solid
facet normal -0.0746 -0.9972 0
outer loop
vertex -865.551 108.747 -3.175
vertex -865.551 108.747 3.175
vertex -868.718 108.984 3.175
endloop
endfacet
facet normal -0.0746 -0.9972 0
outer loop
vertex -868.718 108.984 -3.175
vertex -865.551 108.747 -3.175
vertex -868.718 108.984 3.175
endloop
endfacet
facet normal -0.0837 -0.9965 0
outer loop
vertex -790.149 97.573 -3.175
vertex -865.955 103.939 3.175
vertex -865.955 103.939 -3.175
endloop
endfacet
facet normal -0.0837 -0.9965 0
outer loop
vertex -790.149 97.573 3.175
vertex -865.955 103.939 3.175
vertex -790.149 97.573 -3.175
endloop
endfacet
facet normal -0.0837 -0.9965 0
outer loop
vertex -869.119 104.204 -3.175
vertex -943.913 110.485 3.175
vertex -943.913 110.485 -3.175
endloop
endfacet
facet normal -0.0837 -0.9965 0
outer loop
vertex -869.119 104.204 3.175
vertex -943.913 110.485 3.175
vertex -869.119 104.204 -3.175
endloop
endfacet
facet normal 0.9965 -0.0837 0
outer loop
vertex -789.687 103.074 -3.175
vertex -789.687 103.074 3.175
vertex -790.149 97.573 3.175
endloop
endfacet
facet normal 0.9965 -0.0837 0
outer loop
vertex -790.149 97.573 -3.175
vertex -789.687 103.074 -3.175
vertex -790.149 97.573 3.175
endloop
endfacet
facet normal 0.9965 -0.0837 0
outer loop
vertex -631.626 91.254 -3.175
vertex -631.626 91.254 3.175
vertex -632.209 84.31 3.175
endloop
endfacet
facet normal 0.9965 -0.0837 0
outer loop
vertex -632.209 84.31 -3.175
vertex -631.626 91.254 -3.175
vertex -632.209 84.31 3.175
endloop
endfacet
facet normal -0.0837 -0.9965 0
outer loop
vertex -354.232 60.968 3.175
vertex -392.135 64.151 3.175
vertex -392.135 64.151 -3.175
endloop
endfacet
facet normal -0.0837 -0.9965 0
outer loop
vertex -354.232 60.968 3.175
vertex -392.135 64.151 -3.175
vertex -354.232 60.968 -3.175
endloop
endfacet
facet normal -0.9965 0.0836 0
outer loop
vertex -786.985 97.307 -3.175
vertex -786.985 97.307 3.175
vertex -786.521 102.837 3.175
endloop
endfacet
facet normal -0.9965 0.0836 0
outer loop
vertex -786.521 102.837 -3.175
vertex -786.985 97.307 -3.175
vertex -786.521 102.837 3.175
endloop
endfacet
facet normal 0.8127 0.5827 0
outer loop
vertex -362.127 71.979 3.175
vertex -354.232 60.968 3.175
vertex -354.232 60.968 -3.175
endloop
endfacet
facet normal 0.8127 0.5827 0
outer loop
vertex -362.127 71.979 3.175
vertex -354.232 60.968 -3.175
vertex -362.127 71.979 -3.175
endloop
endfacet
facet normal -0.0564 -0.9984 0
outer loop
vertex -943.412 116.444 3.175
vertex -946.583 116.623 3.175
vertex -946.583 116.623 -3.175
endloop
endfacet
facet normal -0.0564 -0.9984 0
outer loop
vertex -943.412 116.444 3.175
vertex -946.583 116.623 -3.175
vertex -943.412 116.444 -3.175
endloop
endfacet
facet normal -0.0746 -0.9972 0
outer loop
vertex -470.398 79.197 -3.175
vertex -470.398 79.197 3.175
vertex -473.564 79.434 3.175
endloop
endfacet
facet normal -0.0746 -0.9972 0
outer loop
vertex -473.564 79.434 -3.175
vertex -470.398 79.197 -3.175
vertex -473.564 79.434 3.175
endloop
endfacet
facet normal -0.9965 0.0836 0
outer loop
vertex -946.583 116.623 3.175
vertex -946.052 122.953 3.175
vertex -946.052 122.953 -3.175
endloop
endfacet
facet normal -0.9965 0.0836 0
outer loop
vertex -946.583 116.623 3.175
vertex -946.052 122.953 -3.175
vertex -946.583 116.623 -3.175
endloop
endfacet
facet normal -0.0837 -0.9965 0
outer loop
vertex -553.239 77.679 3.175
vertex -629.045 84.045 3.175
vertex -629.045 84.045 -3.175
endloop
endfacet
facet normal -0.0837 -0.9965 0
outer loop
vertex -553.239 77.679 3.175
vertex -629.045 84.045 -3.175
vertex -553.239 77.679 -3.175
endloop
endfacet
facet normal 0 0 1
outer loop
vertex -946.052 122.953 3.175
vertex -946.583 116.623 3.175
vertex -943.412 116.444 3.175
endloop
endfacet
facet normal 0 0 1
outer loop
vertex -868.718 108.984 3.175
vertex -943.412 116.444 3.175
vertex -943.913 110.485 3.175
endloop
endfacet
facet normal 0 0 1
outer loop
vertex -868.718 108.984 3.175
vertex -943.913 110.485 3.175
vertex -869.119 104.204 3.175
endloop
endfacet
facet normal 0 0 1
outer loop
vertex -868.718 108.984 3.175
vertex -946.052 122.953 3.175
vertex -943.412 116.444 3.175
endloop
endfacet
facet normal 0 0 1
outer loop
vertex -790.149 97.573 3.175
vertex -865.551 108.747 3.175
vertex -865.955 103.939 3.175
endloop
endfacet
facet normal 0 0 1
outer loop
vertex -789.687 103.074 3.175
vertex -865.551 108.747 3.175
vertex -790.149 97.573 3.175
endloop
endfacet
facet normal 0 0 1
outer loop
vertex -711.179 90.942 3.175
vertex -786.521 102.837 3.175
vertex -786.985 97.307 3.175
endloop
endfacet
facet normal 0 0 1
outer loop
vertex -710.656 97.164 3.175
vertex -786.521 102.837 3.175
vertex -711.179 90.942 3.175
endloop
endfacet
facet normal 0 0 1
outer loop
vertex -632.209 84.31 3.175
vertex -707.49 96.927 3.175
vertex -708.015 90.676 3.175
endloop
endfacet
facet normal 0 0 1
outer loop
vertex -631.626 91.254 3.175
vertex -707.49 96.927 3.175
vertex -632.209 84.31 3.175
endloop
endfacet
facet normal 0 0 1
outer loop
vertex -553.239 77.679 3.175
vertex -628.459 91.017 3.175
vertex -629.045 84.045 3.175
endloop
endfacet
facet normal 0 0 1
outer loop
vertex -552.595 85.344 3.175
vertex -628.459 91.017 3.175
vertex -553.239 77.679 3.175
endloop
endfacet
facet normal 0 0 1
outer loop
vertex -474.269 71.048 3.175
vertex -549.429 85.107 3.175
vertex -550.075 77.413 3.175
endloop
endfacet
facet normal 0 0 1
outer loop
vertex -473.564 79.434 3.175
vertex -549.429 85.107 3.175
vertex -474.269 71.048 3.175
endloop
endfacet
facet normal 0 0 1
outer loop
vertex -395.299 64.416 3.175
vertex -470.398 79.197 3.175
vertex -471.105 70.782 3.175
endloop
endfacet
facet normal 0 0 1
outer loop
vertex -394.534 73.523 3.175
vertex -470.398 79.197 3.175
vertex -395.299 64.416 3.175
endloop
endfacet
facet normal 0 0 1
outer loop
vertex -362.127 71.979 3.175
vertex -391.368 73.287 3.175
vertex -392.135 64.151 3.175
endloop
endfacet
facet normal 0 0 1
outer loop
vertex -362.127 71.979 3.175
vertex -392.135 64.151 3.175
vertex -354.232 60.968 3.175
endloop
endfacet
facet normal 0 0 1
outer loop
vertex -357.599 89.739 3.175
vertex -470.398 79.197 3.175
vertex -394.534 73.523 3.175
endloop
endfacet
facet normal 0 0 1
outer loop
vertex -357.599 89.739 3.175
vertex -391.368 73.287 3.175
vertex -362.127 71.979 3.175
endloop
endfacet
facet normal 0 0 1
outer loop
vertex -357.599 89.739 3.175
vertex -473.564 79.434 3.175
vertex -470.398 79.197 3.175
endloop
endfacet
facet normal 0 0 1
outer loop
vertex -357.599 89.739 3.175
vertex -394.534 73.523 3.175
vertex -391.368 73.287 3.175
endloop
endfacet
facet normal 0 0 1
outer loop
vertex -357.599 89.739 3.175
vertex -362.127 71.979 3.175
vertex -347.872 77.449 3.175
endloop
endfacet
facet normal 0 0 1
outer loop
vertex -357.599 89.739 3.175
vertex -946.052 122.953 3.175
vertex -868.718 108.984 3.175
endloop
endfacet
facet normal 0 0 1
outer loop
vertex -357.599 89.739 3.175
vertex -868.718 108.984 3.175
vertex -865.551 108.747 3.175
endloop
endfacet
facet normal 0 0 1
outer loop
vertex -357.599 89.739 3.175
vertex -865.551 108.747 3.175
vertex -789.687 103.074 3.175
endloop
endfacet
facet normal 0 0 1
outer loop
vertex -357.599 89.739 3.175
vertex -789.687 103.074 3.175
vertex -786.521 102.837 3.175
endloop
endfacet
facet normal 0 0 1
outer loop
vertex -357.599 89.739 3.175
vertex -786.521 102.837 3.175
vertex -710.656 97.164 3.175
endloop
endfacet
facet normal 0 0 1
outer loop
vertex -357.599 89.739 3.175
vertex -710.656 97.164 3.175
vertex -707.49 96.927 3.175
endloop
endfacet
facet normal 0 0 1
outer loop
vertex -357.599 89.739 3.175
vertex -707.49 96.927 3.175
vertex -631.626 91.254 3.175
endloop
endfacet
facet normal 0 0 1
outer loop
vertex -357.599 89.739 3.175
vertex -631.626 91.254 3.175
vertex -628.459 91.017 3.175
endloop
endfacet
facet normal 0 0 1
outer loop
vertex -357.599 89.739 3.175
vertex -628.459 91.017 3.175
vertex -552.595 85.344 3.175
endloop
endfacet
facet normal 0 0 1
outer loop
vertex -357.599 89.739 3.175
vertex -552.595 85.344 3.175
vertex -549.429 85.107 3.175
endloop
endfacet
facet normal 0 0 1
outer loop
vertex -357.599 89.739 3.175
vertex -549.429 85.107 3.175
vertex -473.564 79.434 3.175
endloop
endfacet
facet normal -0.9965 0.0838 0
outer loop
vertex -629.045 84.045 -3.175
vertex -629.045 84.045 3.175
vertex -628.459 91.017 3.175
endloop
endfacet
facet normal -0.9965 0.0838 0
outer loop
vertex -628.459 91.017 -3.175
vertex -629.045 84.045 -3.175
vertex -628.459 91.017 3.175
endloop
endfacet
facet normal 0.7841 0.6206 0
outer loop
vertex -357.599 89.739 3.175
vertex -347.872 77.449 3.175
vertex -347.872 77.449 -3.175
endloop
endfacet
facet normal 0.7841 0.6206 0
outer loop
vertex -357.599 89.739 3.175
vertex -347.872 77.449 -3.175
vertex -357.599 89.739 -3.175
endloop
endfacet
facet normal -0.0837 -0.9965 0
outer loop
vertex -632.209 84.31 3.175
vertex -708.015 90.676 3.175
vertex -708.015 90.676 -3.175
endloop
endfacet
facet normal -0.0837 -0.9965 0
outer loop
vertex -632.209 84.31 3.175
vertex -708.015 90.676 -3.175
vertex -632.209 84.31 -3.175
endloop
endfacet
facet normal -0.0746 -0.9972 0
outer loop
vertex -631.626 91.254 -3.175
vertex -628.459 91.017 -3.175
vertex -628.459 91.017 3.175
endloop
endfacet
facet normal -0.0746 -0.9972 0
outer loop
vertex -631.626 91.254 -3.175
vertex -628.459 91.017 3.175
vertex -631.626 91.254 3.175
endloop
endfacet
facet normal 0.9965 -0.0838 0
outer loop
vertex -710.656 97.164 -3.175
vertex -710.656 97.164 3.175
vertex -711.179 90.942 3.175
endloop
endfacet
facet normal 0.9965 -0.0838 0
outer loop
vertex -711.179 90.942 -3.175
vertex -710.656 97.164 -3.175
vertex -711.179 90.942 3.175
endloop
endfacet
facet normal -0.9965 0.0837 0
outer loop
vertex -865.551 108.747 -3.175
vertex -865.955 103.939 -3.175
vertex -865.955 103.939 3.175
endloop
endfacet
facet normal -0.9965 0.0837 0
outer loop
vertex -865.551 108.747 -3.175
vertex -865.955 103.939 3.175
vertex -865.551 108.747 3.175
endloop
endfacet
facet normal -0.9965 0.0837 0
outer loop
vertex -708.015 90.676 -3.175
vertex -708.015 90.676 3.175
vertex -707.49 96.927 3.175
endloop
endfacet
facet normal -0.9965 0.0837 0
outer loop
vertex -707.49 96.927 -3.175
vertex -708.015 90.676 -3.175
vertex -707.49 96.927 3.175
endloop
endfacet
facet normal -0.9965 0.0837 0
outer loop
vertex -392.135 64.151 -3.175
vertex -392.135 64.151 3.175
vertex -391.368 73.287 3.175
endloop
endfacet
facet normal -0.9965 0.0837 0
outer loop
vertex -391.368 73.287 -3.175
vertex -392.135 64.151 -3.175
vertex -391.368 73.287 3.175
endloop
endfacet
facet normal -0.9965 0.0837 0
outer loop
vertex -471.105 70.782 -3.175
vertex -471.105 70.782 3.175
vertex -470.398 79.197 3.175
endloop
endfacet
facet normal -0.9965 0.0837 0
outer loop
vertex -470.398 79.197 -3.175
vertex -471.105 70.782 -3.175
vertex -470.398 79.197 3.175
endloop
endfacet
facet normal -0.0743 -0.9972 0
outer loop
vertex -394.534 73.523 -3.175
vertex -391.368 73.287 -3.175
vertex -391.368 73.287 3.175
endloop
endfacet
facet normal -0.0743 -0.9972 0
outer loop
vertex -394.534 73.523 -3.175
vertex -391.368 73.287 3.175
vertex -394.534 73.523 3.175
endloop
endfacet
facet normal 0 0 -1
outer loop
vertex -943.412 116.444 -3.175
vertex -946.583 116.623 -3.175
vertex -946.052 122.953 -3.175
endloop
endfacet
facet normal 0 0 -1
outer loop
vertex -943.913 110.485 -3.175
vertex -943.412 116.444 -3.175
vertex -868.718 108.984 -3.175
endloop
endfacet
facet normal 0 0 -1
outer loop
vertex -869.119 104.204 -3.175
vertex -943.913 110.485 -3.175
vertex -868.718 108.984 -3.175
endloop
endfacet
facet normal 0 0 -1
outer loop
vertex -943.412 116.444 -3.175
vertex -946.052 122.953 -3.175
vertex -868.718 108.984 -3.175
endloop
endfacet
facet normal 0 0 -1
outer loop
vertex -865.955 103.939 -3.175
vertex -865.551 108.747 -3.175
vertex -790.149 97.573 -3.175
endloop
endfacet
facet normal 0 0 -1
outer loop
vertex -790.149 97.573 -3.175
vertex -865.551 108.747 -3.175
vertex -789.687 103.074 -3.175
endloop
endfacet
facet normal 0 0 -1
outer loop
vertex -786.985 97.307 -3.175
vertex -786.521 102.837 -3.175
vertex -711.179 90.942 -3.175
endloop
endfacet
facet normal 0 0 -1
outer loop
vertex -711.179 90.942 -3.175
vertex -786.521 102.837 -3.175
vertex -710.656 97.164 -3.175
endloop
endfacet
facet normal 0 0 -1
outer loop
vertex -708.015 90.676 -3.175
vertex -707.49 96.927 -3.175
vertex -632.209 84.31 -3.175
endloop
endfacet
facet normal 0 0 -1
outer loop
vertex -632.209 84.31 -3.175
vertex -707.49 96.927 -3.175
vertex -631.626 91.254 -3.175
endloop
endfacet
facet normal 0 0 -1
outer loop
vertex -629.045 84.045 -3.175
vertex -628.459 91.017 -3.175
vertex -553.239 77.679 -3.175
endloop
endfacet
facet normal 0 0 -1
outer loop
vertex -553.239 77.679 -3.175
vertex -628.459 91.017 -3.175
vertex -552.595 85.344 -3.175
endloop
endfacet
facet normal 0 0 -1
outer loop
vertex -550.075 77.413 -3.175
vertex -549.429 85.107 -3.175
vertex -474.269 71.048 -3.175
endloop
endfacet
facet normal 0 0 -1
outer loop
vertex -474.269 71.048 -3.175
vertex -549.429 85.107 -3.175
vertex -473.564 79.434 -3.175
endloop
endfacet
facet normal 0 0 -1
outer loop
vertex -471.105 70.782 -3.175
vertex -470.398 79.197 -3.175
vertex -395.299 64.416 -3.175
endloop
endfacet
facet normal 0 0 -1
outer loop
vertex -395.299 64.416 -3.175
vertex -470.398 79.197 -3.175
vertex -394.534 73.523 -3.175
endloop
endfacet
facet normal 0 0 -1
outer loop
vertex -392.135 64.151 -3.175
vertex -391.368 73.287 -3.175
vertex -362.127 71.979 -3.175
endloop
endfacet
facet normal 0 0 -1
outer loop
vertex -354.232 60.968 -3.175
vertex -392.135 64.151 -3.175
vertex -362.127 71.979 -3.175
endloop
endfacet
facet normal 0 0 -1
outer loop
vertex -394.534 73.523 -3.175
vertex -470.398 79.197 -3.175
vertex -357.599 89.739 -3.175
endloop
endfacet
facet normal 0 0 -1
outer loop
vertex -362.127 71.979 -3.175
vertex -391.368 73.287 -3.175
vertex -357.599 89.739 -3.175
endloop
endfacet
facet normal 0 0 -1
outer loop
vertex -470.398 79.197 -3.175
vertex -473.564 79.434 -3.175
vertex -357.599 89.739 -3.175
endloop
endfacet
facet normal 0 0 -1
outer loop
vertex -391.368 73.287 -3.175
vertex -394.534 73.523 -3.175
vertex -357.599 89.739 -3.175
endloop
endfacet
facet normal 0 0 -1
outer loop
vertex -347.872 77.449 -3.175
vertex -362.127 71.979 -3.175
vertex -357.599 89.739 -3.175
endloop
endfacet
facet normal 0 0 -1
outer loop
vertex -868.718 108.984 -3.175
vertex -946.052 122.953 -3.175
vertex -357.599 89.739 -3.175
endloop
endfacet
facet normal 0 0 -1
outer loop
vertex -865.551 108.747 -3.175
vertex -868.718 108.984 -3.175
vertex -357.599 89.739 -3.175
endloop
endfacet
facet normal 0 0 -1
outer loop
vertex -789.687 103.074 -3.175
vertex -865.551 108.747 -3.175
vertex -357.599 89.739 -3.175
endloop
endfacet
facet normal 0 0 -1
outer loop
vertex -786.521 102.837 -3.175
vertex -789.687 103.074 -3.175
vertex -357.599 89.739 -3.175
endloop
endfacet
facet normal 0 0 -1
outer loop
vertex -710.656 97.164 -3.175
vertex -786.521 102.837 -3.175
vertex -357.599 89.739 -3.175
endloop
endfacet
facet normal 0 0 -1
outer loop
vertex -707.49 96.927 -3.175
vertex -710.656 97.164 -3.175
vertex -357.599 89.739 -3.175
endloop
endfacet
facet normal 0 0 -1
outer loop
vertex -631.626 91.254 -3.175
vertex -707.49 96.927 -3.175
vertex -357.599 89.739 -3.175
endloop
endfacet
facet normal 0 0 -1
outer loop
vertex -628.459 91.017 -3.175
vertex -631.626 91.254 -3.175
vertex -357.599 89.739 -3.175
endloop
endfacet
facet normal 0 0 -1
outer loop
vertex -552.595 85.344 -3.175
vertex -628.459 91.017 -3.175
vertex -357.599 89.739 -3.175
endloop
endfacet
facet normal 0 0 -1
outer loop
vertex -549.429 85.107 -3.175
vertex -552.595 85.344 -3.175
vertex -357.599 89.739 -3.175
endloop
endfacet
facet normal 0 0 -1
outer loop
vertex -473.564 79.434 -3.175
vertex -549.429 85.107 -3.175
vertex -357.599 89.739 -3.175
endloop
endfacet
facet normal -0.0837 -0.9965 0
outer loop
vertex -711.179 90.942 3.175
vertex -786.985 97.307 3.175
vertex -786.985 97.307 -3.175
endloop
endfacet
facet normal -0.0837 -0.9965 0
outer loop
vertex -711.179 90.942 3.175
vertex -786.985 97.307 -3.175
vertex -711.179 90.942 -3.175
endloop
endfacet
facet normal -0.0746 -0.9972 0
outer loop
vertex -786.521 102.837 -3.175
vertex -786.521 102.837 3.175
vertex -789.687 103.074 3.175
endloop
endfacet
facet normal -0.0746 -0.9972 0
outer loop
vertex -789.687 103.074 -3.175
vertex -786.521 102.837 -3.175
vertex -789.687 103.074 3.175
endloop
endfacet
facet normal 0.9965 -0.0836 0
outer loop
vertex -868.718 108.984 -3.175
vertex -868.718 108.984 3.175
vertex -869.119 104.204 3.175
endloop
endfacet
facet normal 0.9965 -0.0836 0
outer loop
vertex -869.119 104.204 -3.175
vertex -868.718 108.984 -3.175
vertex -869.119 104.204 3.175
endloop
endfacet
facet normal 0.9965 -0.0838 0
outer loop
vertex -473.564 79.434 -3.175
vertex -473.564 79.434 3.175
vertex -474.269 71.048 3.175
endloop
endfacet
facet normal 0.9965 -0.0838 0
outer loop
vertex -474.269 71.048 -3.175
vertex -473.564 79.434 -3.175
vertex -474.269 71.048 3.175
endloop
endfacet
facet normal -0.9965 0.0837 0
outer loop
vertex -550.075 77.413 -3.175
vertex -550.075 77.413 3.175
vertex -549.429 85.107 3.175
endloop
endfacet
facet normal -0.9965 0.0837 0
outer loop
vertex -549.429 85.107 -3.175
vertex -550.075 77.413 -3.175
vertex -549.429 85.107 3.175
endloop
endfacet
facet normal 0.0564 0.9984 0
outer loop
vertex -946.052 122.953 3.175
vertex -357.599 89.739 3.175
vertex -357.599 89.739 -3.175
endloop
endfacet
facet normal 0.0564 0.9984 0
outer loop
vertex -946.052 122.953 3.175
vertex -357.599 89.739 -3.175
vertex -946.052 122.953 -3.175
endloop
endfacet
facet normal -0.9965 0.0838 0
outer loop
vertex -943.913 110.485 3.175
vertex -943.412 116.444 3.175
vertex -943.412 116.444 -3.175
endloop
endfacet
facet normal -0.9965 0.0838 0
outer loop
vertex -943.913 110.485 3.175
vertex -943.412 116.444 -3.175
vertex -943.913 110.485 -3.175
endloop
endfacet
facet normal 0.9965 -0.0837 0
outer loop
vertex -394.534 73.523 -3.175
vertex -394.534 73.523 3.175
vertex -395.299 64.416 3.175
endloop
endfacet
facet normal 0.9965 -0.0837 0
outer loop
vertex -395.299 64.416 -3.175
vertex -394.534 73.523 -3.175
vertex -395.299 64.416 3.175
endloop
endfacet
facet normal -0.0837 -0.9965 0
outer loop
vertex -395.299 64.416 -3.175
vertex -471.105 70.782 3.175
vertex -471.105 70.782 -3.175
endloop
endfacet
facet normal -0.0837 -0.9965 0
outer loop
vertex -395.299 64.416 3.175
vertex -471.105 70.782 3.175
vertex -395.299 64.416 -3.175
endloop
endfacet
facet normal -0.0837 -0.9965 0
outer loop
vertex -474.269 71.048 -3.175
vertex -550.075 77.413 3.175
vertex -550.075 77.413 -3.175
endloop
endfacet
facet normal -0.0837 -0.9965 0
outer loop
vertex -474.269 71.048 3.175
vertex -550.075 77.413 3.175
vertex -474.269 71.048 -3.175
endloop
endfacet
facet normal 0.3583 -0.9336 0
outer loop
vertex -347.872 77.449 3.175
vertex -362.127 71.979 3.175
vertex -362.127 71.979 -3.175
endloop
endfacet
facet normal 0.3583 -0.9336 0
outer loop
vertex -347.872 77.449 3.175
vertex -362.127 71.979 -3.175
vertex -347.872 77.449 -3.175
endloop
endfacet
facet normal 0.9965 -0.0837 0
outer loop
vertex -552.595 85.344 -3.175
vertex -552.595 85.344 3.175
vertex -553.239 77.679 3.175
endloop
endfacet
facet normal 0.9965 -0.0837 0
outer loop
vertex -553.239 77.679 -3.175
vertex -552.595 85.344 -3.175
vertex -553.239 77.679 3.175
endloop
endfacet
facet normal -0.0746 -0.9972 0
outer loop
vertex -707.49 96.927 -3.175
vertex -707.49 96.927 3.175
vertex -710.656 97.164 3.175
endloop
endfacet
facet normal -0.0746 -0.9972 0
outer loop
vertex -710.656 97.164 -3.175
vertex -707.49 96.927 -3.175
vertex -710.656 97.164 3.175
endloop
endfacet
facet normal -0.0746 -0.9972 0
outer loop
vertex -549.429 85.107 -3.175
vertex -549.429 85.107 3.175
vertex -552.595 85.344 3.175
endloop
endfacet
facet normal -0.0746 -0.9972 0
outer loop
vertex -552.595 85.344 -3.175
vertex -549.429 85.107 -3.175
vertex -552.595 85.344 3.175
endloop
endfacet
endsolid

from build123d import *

# Parameters (mm, degrees)
BOSS_EXTRUDE1_DEPTH = 3.175
CUT_EXTRUDE1_DEPTH  = 7.35
CUT_EXTRUDE2_DEPTH  = 7.62


with BuildPart() as part:
    # Sketch1 → Boss-Extrude1 (new body, symmetric)
    with BuildSketch(Plane.XY):
        Polygon((76.2, 37.697541537), (76.2, 56.747541537), (79.375, 56.747541537), (79.375, 37.697541537), (92.075, 37.697541537), (92.075, 46.587541537), (95.25, 46.587541537), (95.25, 37.697541537), (136.525, 37.697541537), (136.525, 46.587541537), (139.7, 46.587541537), (139.7, 37.697541537), (152.4, 37.697541537), (152.4, 69.447541537), (0, 69.447541537), (-0.423998633, 69.491926731), (-3.587863461, 69.757603883), (-946.051908629, 122.953392794), (-946.583462345, 116.623288424), (-943.412318182, 116.444298555), (-943.91275138, 110.48479854), (-6.775989292, 31.791225946), (-5.713280681, 44.446685258), (-2.549415853, 44.181008106), (-3.612124464, 31.525548794), (-1.492292584, 31.347541537), (0, 31.347541537), (0, 44.047541537), (3.175, 44.047541537), (3.175, 31.347541537), (15.875, 31.347541537), (15.875, 36.427541537), (19.05, 36.427541537), (19.05, 31.347541537), (25.4, 31.347541537), (69.85, 37.697541537), align=None)
    extrude(amount=BOSS_EXTRUDE1_DEPTH, both=True)

    # Sketch2 → Cut-Extrude1 (cut, through all)
    with BuildSketch(Plane.XY.offset(3.175)):
        Polygon((-76.254460917, 37.625496217), (-75.245037036, 49.646404609), (-78.411328309, 49.883186), (-79.418325745, 37.891173369), align=None)
        Polygon((-155.224527027, 44.256797945), (-154.27566721, 55.556468134), (-157.441958483, 55.793249525), (-158.388391855, 44.522475098), align=None)
        Polygon((-234.194593137, 50.888099674), (-233.306297384, 61.466531659), (-236.472588657, 61.70331305), (-237.358457965, 51.153776826), align=None)
        Polygon((-313.164659247, 57.519401402), (-312.336927558, 67.376595183), (-315.503218831, 67.613376574), (-316.328524075, 57.785078555), align=None)
        Polygon((-392.134725356, 64.15070313), (-391.367557732, 73.286658708), (-394.533849005, 73.523440099), (-395.298590185, 64.416380283), align=None)
        Polygon((-471.104791466, 70.782004859), (-470.398187906, 79.196722233), (-473.564479179, 79.433503624), (-474.268656294, 71.047682011), align=None)
        Polygon((-550.074857576, 77.413306587), (-549.42881808, 85.106785757), (-552.595109353, 85.343567149), (-553.238722404, 77.67898374), align=None)
        Polygon((-629.044923686, 84.044608316), (-628.459448254, 91.016849282), (-631.625739527, 91.253630673), (-632.208788514, 84.310285468), align=None)
        Polygon((-708.014989796, 90.675910044), (-707.490078428, 96.926912807), (-710.656369701, 97.163694198), (-711.178854624, 90.941587197), align=None)
        Polygon((-786.985055905, 97.307211772), (-786.520708602, 102.836976331), (-789.686999875, 103.073757723), (-790.148920734, 97.572888925), align=None)
        Polygon((-865.955122015, 103.938513501), (-865.551338776, 108.747039856), (-868.717630049, 108.983821247), (-869.118986843, 104.204190653), align=None)
    extrude(amount=-CUT_EXTRUDE1_DEPTH, mode=Mode.SUBTRACT)

    # Sketch3 → Cut-Extrude2 (cut)
    with BuildSketch(Plane.XY.offset(3.175)):
        Polygon((-354.231624716, 60.967890842), (-362.126685184, 71.979397876), (-347.872352174, 77.449083798), (-357.599036746, 89.739165772), (194.218411841, 89.739165772), (127.81181163, -85.755982461), align=None)
    extrude(amount=-CUT_EXTRUDE2_DEPTH, mode=Mode.SUBTRACT)


solid = part.part
